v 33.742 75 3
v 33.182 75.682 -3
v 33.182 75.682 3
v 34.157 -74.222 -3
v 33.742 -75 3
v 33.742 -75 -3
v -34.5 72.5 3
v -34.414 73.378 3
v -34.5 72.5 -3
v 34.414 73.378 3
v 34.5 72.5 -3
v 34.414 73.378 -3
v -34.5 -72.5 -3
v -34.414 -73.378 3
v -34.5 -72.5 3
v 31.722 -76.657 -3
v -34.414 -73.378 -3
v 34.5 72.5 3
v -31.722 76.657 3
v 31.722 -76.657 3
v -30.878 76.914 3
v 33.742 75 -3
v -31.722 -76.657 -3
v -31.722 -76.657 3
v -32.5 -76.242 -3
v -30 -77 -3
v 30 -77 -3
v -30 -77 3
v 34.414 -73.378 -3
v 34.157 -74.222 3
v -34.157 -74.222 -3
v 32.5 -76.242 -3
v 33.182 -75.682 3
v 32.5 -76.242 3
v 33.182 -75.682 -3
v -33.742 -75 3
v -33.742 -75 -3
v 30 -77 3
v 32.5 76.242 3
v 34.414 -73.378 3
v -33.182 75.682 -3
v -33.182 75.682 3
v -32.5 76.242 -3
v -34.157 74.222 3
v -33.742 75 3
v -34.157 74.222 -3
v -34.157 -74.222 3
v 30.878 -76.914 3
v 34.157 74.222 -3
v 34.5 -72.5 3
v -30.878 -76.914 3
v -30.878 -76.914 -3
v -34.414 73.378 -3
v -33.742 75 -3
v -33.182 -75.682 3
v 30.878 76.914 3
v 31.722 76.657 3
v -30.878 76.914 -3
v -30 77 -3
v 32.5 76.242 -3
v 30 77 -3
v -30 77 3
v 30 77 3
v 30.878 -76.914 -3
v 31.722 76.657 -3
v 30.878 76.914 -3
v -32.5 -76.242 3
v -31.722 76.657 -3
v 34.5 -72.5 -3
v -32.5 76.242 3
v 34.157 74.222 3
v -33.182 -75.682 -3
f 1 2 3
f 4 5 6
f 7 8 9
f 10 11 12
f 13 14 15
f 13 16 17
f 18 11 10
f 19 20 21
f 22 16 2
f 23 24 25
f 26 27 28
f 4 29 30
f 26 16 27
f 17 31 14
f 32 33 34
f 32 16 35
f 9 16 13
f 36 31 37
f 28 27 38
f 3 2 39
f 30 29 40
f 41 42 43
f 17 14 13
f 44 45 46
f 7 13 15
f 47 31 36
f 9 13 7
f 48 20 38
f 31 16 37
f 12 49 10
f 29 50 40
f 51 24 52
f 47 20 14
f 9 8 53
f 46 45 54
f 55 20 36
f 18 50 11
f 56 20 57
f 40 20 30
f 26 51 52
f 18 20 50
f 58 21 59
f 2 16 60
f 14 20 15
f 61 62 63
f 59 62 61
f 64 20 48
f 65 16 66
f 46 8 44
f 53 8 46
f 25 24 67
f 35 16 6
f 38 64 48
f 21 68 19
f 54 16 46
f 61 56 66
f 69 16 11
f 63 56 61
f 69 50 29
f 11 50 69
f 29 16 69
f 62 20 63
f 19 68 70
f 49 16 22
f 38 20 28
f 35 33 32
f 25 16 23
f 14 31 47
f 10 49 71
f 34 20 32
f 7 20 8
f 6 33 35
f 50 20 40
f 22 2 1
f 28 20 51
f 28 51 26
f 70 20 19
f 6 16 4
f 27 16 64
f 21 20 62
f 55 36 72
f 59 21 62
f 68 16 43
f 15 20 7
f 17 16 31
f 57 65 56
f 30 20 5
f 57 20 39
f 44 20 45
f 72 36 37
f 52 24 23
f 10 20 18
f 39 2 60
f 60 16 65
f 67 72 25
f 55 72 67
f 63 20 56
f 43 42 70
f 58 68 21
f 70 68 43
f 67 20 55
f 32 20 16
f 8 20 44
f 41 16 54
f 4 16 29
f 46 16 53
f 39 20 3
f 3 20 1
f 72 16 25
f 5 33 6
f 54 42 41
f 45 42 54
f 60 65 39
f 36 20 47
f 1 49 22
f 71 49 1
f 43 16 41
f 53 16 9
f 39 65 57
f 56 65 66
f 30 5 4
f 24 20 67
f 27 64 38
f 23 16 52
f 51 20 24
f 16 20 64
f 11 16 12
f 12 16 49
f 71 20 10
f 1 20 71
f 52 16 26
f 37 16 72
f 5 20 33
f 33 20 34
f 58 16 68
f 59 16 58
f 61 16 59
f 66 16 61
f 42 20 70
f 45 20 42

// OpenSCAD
// file: test_01.scad
echo("Работа Алексея Коротких!");
len_phone = 145;
width_phone = 60;
thickness_phone = 6;

corner_round = 9;

cube([width_phone, len_phone, thickness_phone], center=true);
module smartphone(){
hull() {
    color("red")
    translate([width_phone/2, len_phone/2, 0])
    cylinder(h=thickness_phone, d=corner_round, $fn=32, center=true);

    mirror([1,0,0])
    color("red")
    translate([width_phone/2, len_phone/2, 0])
    cylinder(h=thickness_phone, d=corner_round, $fn=32, center=true);

    mirror([0,1,0])
    color("red")
    translate([width_phone/2, len_phone/2, 0])
    cylinder(h=thickness_phone, d=corner_round, $fn=32, center=true);

    mirror([1,0,0])
    mirror([0,1,0])
    color("red")
    translate([width_phone/2, len_phone/2, 0])
    cylinder(h=thickness_phone, d=corner_round, $fn=32, center=true);
}
}
// main file
use <test_01.scad>

echo ("Работа Алексея Коротких!");
smartphone();
